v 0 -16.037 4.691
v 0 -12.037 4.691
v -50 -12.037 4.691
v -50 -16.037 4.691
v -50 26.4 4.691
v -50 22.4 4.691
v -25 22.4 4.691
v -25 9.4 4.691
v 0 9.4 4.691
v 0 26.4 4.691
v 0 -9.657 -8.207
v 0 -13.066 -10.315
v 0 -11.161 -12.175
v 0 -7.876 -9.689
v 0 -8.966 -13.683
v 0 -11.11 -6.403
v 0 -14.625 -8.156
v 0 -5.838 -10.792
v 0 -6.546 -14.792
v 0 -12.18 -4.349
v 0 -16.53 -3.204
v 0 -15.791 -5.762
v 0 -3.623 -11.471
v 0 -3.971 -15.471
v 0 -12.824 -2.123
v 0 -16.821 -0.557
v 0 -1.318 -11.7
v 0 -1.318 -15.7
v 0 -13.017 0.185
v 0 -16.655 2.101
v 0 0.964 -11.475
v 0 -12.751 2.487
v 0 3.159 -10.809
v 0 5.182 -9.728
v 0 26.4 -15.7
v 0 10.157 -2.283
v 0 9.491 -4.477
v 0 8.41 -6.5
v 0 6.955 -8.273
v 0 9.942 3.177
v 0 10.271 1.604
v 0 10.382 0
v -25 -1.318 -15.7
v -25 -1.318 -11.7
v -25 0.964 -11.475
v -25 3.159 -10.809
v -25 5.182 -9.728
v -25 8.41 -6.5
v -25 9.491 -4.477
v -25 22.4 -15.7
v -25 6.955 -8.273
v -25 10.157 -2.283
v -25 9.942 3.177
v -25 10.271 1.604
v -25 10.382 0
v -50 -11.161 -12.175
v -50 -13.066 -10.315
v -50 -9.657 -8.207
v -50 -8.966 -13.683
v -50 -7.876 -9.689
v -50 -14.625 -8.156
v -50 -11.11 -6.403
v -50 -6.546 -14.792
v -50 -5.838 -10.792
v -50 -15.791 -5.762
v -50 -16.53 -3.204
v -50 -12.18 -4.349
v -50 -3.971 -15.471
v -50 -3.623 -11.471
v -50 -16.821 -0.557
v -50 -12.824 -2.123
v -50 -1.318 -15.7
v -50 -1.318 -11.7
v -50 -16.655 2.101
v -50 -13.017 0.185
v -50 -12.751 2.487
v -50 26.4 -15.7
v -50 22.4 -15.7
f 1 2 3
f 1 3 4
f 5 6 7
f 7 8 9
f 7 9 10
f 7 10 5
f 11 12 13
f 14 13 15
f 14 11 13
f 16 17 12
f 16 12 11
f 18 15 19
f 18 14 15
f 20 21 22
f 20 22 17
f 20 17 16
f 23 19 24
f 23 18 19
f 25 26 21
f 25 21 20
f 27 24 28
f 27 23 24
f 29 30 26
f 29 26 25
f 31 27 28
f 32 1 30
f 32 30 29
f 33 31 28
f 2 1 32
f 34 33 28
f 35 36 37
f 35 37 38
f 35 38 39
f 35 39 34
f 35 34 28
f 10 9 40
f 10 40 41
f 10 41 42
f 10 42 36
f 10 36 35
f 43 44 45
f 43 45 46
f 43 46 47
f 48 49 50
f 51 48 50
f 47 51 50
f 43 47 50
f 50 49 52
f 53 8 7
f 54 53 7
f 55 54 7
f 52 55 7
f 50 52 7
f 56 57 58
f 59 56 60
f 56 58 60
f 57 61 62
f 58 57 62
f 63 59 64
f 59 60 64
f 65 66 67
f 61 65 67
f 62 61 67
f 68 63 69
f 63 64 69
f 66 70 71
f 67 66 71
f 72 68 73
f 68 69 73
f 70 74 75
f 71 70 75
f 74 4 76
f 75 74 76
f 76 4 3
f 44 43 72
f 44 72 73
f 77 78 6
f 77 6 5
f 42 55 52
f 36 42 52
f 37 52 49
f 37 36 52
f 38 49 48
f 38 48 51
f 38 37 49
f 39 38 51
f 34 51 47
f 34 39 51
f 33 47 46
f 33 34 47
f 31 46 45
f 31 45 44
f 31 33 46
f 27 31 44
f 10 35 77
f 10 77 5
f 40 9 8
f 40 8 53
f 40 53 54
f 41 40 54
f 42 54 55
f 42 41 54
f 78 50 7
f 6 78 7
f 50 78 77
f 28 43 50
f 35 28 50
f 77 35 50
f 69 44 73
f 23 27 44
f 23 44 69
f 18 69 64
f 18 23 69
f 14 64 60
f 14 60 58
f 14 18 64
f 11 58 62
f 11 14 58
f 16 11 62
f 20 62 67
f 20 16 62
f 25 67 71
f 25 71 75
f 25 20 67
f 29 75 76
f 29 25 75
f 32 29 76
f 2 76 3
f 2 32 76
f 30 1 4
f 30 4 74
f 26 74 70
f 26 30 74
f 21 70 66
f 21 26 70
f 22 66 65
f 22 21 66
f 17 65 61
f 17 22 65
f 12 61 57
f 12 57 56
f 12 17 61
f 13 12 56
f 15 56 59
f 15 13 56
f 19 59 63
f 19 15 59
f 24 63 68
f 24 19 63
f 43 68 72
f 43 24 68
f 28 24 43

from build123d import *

# Parameters (mm, degrees)
F1_DEPTH = 25
F2_DEPTH = 50
F0_W     = 4
F0_H     = 20.390722
F3_DEPTH = 50


with BuildPart() as f1:
    # F0 (on Right) → F1 (new body)
    with BuildSketch(Plane.YZ):
        with BuildLine():
            ThreePointArc((9.40047, 4.690722), (10.133936, 2.39615), (10.381929, 0))
            ThreePointArc((10.381929, 0), (6.955078, -8.273149), (-1.318071, -11.7))
            Line((-1.318071, -11.7), (-1.318071, -15.7))
            ThreePointArc((-1.318071, -15.7), (11.25588, -9.268728), (13.40047, 4.690722))
            Line((13.40047, 4.690722), (9.40047, 4.690722))
        make_face()
        with BuildLine():
            Line((22.40047, 4.690722), (13.40047, 4.690722))
            ThreePointArc((13.40047, 4.690722), (11.25588, -9.268728), (-1.318071, -15.7))
            Line((-1.318071, -15.7), (22.40047, -15.7))
            Line((22.40047, -15.7), (22.40047, 4.690722))
        make_face()
    extrude(amount=-F1_DEPTH)

    # F0 (on Right) → F2 (join)
    with BuildSketch(Plane.YZ):
        with BuildLine():
            Line((-1.318071, -15.7), (-1.318071, -11.7))
            ThreePointArc((-1.318071, -11.7), (-11.110197, -6.403458), (-12.036612, 4.690722))
            Line((-12.036612, 4.690722), (-16.036612, 4.690722))
            ThreePointArc((-16.036612, 4.690722), (-13.892023, -9.268728), (-1.318071, -15.7))
        make_face()
    extrude(amount=-F2_DEPTH)

    # F0 (on Right) → F3 (join)
    with BuildSketch(Plane.YZ):
        with Locations((24.40047, -5.504639)):
            Rectangle(F0_W, F0_H)
    extrude(amount=-F3_DEPTH)


with BuildPart() as f4_1:
    # F4: copy of F1
    add(f1.part)


with BuildPart() as f5_1:
    # F5: instance of F4_1
    add(f4_1.part.mirror(Plane(origin=(0, 10.566171, -6.716884), x_dir=(0, 1, 0), z_dir=(1, 0, 0))))


solid = f1.part
